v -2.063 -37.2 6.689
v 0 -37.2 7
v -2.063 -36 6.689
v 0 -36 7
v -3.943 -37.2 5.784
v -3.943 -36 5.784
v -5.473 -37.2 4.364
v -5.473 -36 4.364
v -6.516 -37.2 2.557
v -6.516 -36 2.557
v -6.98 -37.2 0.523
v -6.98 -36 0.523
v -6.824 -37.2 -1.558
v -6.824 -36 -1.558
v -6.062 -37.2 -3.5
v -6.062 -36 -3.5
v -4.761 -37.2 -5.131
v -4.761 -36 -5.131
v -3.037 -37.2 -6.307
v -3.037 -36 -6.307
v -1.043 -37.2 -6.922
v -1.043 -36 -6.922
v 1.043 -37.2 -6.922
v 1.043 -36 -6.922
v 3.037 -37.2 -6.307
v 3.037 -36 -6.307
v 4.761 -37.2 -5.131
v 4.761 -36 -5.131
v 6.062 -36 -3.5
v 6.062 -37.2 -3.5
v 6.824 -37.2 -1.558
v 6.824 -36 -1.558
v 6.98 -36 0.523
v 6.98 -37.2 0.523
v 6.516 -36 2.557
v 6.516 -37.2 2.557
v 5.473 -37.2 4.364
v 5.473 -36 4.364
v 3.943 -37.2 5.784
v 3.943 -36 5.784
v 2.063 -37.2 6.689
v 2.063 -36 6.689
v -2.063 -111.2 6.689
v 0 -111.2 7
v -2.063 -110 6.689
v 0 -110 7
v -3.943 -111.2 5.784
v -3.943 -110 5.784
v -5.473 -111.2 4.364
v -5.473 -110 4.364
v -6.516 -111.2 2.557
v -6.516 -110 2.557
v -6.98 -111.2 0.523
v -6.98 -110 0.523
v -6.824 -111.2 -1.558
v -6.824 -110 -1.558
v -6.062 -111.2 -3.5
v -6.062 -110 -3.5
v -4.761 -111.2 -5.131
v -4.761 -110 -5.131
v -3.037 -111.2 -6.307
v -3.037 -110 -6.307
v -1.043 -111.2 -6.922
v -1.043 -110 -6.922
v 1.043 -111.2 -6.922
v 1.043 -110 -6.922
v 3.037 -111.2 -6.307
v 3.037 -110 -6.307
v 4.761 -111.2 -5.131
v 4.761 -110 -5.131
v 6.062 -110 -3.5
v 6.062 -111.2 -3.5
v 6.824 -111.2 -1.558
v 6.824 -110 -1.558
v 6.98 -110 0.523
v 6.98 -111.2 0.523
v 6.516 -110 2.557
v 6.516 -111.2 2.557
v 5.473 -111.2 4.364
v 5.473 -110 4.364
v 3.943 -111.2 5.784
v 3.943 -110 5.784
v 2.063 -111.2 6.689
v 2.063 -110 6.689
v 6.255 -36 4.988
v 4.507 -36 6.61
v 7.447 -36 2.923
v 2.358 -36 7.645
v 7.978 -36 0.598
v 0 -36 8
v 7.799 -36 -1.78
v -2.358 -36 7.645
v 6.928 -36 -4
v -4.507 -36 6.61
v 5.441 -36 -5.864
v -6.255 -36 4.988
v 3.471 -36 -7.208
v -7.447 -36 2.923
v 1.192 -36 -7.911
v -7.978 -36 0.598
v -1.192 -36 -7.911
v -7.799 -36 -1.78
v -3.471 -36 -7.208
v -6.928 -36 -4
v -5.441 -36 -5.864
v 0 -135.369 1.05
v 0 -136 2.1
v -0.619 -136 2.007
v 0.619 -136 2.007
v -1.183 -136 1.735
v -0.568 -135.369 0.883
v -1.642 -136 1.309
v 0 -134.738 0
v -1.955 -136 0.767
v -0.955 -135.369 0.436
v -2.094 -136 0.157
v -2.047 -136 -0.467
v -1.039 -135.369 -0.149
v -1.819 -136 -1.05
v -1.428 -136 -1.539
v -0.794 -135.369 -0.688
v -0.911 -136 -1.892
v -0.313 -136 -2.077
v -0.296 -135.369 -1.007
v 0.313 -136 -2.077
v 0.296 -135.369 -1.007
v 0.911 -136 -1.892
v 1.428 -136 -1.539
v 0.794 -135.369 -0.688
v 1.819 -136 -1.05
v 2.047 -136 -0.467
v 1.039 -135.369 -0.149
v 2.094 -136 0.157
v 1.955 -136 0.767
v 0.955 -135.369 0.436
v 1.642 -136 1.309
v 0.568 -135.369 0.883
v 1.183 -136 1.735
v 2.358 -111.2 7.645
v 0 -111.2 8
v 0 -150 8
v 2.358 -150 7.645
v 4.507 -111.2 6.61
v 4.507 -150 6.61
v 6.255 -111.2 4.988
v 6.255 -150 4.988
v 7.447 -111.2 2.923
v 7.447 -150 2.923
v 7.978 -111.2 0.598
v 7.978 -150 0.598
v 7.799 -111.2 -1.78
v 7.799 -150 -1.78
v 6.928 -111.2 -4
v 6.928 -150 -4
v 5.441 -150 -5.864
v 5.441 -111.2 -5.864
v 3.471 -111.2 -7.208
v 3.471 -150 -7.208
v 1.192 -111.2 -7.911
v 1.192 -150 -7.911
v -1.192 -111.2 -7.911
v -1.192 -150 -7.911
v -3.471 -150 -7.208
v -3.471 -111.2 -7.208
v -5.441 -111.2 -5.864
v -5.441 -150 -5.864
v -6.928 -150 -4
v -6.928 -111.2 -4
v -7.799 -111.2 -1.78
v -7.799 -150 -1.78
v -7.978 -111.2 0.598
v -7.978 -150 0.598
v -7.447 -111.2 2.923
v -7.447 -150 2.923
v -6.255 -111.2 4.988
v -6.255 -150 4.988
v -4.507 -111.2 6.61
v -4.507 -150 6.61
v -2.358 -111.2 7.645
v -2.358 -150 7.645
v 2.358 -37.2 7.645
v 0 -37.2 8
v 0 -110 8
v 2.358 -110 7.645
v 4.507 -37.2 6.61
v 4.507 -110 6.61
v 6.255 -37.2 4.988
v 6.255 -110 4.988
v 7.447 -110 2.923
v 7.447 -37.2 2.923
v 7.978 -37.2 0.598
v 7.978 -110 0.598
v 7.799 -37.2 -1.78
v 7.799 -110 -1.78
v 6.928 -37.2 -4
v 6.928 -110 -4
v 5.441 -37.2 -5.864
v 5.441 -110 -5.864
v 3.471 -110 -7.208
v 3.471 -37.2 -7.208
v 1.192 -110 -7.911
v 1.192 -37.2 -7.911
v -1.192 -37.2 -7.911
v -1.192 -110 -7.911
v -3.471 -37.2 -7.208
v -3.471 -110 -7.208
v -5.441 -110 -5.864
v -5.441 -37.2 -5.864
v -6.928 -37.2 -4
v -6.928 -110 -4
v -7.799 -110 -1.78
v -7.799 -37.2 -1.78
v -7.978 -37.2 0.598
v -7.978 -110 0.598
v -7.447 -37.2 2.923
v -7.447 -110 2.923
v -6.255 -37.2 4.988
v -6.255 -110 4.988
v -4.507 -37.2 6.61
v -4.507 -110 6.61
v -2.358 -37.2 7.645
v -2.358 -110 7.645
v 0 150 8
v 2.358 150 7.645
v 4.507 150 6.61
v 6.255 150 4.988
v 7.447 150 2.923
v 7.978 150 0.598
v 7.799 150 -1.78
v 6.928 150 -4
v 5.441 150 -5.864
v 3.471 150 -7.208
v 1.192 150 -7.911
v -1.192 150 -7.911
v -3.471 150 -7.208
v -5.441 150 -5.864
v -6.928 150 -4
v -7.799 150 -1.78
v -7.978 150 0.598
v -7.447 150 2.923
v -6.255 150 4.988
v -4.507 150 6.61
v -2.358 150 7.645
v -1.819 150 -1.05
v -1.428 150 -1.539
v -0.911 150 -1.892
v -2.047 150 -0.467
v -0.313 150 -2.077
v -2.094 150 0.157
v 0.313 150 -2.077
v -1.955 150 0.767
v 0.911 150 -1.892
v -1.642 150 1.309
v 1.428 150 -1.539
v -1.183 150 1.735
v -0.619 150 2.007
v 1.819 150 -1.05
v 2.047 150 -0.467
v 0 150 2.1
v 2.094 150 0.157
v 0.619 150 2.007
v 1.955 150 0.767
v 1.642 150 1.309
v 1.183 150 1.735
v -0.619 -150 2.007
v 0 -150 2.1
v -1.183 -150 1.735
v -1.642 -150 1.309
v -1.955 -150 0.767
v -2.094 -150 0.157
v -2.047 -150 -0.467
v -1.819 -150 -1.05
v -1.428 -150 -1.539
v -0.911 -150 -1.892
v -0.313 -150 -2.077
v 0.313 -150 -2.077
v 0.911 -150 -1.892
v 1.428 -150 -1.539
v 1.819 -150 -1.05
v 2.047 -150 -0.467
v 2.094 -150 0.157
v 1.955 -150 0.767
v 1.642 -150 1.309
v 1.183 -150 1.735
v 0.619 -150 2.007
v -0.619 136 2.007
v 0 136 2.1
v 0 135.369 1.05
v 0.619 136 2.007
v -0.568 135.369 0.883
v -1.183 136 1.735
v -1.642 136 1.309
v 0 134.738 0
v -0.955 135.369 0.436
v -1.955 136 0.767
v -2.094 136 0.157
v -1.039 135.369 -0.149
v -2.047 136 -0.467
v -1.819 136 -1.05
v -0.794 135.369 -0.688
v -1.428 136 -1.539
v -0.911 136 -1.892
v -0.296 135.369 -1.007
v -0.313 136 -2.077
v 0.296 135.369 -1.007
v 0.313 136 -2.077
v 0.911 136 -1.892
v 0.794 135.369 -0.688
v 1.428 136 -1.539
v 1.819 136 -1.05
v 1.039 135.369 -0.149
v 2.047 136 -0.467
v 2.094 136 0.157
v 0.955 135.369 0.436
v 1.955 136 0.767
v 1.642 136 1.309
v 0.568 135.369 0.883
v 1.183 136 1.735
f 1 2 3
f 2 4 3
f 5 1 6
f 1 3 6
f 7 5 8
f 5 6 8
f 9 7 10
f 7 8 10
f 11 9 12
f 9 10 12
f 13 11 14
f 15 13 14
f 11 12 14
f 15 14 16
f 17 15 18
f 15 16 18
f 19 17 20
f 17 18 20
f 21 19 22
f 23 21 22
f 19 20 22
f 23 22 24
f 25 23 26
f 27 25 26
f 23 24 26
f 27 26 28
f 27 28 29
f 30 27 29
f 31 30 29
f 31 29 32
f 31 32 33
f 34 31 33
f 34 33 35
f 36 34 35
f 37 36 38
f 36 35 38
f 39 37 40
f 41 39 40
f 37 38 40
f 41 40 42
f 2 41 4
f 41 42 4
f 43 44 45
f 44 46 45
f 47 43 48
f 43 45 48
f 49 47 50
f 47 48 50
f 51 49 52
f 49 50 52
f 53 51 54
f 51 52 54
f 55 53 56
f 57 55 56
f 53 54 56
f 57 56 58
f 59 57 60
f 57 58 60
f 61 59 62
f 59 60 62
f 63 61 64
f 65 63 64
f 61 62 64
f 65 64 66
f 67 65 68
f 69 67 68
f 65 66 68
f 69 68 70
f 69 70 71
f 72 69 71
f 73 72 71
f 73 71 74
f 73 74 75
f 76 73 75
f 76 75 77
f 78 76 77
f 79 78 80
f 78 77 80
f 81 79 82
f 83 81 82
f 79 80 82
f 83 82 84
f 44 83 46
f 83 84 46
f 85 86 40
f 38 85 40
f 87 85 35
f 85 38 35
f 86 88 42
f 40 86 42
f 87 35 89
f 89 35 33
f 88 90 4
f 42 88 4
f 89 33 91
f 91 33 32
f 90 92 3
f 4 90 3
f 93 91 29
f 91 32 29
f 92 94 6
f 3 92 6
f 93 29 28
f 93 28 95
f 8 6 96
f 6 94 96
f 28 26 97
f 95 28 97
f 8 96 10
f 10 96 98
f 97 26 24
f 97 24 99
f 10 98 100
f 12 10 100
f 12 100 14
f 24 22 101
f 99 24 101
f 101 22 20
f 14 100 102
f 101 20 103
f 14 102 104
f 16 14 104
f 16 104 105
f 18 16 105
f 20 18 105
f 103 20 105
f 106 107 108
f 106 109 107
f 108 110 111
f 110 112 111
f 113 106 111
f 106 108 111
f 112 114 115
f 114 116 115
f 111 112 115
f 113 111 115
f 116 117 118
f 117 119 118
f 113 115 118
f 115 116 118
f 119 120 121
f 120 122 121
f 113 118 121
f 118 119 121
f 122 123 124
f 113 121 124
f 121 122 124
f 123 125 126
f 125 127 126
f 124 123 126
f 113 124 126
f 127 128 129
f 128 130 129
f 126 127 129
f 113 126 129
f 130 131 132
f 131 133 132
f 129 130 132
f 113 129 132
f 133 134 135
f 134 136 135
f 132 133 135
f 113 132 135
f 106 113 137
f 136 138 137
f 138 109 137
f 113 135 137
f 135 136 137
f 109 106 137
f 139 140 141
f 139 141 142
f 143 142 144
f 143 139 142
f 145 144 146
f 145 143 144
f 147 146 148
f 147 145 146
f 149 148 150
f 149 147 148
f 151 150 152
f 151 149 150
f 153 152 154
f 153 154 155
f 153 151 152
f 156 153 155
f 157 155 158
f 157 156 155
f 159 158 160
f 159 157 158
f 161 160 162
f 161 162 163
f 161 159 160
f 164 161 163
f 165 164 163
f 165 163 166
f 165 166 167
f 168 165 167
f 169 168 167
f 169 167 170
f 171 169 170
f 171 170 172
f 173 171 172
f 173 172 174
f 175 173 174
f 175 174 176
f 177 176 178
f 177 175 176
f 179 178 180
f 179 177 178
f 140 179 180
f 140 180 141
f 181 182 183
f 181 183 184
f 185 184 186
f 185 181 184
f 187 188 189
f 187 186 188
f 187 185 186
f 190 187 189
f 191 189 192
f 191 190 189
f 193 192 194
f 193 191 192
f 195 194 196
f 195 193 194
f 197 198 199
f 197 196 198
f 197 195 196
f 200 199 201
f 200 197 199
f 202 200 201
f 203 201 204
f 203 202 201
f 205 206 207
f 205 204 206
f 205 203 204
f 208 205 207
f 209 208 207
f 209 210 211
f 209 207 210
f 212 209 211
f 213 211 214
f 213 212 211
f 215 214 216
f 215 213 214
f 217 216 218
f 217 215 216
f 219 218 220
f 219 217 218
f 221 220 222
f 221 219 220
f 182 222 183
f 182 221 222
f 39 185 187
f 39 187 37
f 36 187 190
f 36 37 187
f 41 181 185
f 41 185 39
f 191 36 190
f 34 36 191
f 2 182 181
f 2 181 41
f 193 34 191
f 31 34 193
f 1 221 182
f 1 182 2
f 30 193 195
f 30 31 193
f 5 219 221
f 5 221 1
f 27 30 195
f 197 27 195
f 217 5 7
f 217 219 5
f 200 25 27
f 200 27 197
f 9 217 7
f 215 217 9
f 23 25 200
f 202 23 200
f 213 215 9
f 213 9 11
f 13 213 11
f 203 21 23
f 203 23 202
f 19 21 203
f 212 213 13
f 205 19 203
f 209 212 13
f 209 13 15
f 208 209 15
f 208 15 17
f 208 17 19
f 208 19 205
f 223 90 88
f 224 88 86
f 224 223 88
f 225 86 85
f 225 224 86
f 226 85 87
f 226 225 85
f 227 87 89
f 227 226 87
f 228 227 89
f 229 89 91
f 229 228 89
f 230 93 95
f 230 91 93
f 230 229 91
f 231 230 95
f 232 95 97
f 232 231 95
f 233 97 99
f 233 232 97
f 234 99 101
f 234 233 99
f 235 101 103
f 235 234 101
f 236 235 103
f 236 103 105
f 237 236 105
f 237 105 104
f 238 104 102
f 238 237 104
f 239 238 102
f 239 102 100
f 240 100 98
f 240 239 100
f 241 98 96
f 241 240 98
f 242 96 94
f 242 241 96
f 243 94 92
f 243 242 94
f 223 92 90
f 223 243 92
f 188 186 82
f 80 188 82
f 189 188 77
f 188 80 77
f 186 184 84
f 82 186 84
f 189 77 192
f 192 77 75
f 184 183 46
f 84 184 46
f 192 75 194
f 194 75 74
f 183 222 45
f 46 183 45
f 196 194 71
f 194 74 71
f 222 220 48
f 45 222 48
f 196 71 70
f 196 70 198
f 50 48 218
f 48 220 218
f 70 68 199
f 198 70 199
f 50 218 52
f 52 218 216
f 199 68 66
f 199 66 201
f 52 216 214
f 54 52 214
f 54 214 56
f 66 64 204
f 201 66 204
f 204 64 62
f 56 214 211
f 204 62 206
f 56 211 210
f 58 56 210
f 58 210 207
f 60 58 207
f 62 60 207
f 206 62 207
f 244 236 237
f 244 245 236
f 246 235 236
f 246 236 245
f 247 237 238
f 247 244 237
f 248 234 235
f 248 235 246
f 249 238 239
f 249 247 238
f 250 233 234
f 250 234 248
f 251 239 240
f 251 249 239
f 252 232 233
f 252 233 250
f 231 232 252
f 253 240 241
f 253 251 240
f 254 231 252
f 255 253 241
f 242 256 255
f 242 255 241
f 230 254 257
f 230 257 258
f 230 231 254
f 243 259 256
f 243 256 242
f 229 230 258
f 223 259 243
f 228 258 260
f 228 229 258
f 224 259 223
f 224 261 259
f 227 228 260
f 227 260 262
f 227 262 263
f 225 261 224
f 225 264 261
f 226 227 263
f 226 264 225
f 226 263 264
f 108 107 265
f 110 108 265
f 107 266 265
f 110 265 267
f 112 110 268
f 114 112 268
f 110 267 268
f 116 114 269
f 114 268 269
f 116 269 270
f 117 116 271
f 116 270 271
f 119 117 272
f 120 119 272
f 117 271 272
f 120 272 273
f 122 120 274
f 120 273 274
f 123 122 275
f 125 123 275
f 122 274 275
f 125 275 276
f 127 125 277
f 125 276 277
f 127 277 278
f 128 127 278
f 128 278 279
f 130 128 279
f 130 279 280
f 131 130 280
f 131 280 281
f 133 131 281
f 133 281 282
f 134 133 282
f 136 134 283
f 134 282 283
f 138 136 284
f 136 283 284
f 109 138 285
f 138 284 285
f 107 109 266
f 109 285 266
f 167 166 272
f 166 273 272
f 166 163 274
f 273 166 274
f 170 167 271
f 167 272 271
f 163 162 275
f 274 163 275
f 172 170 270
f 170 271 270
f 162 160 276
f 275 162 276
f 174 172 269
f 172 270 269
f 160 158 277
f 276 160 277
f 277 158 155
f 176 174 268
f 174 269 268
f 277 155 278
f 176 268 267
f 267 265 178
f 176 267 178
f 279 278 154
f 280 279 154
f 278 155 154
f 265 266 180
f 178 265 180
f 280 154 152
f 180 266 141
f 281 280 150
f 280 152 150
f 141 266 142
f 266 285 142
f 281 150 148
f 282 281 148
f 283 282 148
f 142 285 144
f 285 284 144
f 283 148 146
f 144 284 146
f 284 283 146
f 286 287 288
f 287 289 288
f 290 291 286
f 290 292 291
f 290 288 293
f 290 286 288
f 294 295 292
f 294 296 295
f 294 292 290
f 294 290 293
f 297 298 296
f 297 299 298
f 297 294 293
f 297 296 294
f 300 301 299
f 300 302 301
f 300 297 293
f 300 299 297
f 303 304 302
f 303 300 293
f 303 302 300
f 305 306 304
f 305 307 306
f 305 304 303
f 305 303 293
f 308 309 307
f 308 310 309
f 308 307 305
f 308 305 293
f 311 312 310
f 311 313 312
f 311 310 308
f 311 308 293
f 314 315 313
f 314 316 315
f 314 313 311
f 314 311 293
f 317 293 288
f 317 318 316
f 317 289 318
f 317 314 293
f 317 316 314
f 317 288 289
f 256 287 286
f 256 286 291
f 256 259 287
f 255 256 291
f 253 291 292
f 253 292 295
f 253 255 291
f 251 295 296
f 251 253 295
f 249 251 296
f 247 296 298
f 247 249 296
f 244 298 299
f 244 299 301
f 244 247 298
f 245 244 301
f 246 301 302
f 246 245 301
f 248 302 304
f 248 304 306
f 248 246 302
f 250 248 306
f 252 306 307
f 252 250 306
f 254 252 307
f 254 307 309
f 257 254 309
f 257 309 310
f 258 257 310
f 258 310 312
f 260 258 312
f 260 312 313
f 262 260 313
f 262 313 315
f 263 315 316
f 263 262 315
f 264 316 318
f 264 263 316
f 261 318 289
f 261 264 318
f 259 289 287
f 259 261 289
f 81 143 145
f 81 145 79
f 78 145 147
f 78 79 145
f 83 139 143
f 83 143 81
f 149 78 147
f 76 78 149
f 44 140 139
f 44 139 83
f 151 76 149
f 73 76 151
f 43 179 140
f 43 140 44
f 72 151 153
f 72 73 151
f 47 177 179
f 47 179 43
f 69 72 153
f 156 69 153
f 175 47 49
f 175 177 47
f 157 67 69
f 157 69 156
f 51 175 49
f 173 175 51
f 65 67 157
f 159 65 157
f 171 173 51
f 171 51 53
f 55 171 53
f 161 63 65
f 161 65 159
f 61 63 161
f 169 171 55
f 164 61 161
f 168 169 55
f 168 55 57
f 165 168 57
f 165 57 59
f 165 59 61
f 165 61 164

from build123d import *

# Parameters (mm, degrees)
SKETCH_1_R             = 8
EXTRUDE_1_DEPTH        = 150
SKETCH_5_W             = 1
SKETCH_5_H             = 1.2
PATTERN_LINEAR_1_COUNT = 2
PATTERN_LINEAR_1_PITCH = 74


with BuildPart() as part:
    # 草图1 → 凸台-拉伸1 (new, symmetric)
    with BuildSketch(Plane(origin=(0, 0, 0), x_dir=(1, 0, 0), z_dir=(0, 1, 0))):
        with Locations(Location((0, 0, 0), (0, 0, 270))):
            Circle(SKETCH_1_R)
    extrude(amount=EXTRUDE_1_DEPTH, both=True)

    # 草图3 → M5 螺纹孔1 (revolve, cut)
    with BuildSketch(Plane(origin=(0, 150, 0), x_dir=(0, 0, 1), z_dir=(1, 0, 0))):
        Polygon((0, 0), (0, 15.2618073), (2.1, 14), (2.1, 0), align=None)
    hole_wizard_m5_1 = revolve(axis=Axis((0, 156.35, 0), (0, -1, 0)), mode=Mode.SUBTRACT)

    # 镜向1: M5 螺纹孔1 across plane
    add(hole_wizard_m5_1.mirror(Plane.ZX), mode=Mode.SUBTRACT)

    # 草图5 → 切除-旋转1 (revolve, cut)
    with BuildSketch(Plane.XY, mode=Mode.PRIVATE) as cut_revolve_1_sk:
        with Locations((7.5, -110.6)):
            Rectangle(SKETCH_5_W, SKETCH_5_H)
    cut_revolve_1 = revolve(cut_revolve_1_sk.sketch.rotate(Axis((0, 150, 0), (0, -1, 0)), 90), axis=Axis((0, 150, 0), (0, -1, 0)), mode=Mode.SUBTRACT)

    # 阵列(线性)1: 切除-旋转1 ×2
    with Locations(*[(0, i * PATTERN_LINEAR_1_PITCH, 0) for i in range(1, PATTERN_LINEAR_1_COUNT)]):
        add(cut_revolve_1, mode=Mode.SUBTRACT)


solid = part.part
